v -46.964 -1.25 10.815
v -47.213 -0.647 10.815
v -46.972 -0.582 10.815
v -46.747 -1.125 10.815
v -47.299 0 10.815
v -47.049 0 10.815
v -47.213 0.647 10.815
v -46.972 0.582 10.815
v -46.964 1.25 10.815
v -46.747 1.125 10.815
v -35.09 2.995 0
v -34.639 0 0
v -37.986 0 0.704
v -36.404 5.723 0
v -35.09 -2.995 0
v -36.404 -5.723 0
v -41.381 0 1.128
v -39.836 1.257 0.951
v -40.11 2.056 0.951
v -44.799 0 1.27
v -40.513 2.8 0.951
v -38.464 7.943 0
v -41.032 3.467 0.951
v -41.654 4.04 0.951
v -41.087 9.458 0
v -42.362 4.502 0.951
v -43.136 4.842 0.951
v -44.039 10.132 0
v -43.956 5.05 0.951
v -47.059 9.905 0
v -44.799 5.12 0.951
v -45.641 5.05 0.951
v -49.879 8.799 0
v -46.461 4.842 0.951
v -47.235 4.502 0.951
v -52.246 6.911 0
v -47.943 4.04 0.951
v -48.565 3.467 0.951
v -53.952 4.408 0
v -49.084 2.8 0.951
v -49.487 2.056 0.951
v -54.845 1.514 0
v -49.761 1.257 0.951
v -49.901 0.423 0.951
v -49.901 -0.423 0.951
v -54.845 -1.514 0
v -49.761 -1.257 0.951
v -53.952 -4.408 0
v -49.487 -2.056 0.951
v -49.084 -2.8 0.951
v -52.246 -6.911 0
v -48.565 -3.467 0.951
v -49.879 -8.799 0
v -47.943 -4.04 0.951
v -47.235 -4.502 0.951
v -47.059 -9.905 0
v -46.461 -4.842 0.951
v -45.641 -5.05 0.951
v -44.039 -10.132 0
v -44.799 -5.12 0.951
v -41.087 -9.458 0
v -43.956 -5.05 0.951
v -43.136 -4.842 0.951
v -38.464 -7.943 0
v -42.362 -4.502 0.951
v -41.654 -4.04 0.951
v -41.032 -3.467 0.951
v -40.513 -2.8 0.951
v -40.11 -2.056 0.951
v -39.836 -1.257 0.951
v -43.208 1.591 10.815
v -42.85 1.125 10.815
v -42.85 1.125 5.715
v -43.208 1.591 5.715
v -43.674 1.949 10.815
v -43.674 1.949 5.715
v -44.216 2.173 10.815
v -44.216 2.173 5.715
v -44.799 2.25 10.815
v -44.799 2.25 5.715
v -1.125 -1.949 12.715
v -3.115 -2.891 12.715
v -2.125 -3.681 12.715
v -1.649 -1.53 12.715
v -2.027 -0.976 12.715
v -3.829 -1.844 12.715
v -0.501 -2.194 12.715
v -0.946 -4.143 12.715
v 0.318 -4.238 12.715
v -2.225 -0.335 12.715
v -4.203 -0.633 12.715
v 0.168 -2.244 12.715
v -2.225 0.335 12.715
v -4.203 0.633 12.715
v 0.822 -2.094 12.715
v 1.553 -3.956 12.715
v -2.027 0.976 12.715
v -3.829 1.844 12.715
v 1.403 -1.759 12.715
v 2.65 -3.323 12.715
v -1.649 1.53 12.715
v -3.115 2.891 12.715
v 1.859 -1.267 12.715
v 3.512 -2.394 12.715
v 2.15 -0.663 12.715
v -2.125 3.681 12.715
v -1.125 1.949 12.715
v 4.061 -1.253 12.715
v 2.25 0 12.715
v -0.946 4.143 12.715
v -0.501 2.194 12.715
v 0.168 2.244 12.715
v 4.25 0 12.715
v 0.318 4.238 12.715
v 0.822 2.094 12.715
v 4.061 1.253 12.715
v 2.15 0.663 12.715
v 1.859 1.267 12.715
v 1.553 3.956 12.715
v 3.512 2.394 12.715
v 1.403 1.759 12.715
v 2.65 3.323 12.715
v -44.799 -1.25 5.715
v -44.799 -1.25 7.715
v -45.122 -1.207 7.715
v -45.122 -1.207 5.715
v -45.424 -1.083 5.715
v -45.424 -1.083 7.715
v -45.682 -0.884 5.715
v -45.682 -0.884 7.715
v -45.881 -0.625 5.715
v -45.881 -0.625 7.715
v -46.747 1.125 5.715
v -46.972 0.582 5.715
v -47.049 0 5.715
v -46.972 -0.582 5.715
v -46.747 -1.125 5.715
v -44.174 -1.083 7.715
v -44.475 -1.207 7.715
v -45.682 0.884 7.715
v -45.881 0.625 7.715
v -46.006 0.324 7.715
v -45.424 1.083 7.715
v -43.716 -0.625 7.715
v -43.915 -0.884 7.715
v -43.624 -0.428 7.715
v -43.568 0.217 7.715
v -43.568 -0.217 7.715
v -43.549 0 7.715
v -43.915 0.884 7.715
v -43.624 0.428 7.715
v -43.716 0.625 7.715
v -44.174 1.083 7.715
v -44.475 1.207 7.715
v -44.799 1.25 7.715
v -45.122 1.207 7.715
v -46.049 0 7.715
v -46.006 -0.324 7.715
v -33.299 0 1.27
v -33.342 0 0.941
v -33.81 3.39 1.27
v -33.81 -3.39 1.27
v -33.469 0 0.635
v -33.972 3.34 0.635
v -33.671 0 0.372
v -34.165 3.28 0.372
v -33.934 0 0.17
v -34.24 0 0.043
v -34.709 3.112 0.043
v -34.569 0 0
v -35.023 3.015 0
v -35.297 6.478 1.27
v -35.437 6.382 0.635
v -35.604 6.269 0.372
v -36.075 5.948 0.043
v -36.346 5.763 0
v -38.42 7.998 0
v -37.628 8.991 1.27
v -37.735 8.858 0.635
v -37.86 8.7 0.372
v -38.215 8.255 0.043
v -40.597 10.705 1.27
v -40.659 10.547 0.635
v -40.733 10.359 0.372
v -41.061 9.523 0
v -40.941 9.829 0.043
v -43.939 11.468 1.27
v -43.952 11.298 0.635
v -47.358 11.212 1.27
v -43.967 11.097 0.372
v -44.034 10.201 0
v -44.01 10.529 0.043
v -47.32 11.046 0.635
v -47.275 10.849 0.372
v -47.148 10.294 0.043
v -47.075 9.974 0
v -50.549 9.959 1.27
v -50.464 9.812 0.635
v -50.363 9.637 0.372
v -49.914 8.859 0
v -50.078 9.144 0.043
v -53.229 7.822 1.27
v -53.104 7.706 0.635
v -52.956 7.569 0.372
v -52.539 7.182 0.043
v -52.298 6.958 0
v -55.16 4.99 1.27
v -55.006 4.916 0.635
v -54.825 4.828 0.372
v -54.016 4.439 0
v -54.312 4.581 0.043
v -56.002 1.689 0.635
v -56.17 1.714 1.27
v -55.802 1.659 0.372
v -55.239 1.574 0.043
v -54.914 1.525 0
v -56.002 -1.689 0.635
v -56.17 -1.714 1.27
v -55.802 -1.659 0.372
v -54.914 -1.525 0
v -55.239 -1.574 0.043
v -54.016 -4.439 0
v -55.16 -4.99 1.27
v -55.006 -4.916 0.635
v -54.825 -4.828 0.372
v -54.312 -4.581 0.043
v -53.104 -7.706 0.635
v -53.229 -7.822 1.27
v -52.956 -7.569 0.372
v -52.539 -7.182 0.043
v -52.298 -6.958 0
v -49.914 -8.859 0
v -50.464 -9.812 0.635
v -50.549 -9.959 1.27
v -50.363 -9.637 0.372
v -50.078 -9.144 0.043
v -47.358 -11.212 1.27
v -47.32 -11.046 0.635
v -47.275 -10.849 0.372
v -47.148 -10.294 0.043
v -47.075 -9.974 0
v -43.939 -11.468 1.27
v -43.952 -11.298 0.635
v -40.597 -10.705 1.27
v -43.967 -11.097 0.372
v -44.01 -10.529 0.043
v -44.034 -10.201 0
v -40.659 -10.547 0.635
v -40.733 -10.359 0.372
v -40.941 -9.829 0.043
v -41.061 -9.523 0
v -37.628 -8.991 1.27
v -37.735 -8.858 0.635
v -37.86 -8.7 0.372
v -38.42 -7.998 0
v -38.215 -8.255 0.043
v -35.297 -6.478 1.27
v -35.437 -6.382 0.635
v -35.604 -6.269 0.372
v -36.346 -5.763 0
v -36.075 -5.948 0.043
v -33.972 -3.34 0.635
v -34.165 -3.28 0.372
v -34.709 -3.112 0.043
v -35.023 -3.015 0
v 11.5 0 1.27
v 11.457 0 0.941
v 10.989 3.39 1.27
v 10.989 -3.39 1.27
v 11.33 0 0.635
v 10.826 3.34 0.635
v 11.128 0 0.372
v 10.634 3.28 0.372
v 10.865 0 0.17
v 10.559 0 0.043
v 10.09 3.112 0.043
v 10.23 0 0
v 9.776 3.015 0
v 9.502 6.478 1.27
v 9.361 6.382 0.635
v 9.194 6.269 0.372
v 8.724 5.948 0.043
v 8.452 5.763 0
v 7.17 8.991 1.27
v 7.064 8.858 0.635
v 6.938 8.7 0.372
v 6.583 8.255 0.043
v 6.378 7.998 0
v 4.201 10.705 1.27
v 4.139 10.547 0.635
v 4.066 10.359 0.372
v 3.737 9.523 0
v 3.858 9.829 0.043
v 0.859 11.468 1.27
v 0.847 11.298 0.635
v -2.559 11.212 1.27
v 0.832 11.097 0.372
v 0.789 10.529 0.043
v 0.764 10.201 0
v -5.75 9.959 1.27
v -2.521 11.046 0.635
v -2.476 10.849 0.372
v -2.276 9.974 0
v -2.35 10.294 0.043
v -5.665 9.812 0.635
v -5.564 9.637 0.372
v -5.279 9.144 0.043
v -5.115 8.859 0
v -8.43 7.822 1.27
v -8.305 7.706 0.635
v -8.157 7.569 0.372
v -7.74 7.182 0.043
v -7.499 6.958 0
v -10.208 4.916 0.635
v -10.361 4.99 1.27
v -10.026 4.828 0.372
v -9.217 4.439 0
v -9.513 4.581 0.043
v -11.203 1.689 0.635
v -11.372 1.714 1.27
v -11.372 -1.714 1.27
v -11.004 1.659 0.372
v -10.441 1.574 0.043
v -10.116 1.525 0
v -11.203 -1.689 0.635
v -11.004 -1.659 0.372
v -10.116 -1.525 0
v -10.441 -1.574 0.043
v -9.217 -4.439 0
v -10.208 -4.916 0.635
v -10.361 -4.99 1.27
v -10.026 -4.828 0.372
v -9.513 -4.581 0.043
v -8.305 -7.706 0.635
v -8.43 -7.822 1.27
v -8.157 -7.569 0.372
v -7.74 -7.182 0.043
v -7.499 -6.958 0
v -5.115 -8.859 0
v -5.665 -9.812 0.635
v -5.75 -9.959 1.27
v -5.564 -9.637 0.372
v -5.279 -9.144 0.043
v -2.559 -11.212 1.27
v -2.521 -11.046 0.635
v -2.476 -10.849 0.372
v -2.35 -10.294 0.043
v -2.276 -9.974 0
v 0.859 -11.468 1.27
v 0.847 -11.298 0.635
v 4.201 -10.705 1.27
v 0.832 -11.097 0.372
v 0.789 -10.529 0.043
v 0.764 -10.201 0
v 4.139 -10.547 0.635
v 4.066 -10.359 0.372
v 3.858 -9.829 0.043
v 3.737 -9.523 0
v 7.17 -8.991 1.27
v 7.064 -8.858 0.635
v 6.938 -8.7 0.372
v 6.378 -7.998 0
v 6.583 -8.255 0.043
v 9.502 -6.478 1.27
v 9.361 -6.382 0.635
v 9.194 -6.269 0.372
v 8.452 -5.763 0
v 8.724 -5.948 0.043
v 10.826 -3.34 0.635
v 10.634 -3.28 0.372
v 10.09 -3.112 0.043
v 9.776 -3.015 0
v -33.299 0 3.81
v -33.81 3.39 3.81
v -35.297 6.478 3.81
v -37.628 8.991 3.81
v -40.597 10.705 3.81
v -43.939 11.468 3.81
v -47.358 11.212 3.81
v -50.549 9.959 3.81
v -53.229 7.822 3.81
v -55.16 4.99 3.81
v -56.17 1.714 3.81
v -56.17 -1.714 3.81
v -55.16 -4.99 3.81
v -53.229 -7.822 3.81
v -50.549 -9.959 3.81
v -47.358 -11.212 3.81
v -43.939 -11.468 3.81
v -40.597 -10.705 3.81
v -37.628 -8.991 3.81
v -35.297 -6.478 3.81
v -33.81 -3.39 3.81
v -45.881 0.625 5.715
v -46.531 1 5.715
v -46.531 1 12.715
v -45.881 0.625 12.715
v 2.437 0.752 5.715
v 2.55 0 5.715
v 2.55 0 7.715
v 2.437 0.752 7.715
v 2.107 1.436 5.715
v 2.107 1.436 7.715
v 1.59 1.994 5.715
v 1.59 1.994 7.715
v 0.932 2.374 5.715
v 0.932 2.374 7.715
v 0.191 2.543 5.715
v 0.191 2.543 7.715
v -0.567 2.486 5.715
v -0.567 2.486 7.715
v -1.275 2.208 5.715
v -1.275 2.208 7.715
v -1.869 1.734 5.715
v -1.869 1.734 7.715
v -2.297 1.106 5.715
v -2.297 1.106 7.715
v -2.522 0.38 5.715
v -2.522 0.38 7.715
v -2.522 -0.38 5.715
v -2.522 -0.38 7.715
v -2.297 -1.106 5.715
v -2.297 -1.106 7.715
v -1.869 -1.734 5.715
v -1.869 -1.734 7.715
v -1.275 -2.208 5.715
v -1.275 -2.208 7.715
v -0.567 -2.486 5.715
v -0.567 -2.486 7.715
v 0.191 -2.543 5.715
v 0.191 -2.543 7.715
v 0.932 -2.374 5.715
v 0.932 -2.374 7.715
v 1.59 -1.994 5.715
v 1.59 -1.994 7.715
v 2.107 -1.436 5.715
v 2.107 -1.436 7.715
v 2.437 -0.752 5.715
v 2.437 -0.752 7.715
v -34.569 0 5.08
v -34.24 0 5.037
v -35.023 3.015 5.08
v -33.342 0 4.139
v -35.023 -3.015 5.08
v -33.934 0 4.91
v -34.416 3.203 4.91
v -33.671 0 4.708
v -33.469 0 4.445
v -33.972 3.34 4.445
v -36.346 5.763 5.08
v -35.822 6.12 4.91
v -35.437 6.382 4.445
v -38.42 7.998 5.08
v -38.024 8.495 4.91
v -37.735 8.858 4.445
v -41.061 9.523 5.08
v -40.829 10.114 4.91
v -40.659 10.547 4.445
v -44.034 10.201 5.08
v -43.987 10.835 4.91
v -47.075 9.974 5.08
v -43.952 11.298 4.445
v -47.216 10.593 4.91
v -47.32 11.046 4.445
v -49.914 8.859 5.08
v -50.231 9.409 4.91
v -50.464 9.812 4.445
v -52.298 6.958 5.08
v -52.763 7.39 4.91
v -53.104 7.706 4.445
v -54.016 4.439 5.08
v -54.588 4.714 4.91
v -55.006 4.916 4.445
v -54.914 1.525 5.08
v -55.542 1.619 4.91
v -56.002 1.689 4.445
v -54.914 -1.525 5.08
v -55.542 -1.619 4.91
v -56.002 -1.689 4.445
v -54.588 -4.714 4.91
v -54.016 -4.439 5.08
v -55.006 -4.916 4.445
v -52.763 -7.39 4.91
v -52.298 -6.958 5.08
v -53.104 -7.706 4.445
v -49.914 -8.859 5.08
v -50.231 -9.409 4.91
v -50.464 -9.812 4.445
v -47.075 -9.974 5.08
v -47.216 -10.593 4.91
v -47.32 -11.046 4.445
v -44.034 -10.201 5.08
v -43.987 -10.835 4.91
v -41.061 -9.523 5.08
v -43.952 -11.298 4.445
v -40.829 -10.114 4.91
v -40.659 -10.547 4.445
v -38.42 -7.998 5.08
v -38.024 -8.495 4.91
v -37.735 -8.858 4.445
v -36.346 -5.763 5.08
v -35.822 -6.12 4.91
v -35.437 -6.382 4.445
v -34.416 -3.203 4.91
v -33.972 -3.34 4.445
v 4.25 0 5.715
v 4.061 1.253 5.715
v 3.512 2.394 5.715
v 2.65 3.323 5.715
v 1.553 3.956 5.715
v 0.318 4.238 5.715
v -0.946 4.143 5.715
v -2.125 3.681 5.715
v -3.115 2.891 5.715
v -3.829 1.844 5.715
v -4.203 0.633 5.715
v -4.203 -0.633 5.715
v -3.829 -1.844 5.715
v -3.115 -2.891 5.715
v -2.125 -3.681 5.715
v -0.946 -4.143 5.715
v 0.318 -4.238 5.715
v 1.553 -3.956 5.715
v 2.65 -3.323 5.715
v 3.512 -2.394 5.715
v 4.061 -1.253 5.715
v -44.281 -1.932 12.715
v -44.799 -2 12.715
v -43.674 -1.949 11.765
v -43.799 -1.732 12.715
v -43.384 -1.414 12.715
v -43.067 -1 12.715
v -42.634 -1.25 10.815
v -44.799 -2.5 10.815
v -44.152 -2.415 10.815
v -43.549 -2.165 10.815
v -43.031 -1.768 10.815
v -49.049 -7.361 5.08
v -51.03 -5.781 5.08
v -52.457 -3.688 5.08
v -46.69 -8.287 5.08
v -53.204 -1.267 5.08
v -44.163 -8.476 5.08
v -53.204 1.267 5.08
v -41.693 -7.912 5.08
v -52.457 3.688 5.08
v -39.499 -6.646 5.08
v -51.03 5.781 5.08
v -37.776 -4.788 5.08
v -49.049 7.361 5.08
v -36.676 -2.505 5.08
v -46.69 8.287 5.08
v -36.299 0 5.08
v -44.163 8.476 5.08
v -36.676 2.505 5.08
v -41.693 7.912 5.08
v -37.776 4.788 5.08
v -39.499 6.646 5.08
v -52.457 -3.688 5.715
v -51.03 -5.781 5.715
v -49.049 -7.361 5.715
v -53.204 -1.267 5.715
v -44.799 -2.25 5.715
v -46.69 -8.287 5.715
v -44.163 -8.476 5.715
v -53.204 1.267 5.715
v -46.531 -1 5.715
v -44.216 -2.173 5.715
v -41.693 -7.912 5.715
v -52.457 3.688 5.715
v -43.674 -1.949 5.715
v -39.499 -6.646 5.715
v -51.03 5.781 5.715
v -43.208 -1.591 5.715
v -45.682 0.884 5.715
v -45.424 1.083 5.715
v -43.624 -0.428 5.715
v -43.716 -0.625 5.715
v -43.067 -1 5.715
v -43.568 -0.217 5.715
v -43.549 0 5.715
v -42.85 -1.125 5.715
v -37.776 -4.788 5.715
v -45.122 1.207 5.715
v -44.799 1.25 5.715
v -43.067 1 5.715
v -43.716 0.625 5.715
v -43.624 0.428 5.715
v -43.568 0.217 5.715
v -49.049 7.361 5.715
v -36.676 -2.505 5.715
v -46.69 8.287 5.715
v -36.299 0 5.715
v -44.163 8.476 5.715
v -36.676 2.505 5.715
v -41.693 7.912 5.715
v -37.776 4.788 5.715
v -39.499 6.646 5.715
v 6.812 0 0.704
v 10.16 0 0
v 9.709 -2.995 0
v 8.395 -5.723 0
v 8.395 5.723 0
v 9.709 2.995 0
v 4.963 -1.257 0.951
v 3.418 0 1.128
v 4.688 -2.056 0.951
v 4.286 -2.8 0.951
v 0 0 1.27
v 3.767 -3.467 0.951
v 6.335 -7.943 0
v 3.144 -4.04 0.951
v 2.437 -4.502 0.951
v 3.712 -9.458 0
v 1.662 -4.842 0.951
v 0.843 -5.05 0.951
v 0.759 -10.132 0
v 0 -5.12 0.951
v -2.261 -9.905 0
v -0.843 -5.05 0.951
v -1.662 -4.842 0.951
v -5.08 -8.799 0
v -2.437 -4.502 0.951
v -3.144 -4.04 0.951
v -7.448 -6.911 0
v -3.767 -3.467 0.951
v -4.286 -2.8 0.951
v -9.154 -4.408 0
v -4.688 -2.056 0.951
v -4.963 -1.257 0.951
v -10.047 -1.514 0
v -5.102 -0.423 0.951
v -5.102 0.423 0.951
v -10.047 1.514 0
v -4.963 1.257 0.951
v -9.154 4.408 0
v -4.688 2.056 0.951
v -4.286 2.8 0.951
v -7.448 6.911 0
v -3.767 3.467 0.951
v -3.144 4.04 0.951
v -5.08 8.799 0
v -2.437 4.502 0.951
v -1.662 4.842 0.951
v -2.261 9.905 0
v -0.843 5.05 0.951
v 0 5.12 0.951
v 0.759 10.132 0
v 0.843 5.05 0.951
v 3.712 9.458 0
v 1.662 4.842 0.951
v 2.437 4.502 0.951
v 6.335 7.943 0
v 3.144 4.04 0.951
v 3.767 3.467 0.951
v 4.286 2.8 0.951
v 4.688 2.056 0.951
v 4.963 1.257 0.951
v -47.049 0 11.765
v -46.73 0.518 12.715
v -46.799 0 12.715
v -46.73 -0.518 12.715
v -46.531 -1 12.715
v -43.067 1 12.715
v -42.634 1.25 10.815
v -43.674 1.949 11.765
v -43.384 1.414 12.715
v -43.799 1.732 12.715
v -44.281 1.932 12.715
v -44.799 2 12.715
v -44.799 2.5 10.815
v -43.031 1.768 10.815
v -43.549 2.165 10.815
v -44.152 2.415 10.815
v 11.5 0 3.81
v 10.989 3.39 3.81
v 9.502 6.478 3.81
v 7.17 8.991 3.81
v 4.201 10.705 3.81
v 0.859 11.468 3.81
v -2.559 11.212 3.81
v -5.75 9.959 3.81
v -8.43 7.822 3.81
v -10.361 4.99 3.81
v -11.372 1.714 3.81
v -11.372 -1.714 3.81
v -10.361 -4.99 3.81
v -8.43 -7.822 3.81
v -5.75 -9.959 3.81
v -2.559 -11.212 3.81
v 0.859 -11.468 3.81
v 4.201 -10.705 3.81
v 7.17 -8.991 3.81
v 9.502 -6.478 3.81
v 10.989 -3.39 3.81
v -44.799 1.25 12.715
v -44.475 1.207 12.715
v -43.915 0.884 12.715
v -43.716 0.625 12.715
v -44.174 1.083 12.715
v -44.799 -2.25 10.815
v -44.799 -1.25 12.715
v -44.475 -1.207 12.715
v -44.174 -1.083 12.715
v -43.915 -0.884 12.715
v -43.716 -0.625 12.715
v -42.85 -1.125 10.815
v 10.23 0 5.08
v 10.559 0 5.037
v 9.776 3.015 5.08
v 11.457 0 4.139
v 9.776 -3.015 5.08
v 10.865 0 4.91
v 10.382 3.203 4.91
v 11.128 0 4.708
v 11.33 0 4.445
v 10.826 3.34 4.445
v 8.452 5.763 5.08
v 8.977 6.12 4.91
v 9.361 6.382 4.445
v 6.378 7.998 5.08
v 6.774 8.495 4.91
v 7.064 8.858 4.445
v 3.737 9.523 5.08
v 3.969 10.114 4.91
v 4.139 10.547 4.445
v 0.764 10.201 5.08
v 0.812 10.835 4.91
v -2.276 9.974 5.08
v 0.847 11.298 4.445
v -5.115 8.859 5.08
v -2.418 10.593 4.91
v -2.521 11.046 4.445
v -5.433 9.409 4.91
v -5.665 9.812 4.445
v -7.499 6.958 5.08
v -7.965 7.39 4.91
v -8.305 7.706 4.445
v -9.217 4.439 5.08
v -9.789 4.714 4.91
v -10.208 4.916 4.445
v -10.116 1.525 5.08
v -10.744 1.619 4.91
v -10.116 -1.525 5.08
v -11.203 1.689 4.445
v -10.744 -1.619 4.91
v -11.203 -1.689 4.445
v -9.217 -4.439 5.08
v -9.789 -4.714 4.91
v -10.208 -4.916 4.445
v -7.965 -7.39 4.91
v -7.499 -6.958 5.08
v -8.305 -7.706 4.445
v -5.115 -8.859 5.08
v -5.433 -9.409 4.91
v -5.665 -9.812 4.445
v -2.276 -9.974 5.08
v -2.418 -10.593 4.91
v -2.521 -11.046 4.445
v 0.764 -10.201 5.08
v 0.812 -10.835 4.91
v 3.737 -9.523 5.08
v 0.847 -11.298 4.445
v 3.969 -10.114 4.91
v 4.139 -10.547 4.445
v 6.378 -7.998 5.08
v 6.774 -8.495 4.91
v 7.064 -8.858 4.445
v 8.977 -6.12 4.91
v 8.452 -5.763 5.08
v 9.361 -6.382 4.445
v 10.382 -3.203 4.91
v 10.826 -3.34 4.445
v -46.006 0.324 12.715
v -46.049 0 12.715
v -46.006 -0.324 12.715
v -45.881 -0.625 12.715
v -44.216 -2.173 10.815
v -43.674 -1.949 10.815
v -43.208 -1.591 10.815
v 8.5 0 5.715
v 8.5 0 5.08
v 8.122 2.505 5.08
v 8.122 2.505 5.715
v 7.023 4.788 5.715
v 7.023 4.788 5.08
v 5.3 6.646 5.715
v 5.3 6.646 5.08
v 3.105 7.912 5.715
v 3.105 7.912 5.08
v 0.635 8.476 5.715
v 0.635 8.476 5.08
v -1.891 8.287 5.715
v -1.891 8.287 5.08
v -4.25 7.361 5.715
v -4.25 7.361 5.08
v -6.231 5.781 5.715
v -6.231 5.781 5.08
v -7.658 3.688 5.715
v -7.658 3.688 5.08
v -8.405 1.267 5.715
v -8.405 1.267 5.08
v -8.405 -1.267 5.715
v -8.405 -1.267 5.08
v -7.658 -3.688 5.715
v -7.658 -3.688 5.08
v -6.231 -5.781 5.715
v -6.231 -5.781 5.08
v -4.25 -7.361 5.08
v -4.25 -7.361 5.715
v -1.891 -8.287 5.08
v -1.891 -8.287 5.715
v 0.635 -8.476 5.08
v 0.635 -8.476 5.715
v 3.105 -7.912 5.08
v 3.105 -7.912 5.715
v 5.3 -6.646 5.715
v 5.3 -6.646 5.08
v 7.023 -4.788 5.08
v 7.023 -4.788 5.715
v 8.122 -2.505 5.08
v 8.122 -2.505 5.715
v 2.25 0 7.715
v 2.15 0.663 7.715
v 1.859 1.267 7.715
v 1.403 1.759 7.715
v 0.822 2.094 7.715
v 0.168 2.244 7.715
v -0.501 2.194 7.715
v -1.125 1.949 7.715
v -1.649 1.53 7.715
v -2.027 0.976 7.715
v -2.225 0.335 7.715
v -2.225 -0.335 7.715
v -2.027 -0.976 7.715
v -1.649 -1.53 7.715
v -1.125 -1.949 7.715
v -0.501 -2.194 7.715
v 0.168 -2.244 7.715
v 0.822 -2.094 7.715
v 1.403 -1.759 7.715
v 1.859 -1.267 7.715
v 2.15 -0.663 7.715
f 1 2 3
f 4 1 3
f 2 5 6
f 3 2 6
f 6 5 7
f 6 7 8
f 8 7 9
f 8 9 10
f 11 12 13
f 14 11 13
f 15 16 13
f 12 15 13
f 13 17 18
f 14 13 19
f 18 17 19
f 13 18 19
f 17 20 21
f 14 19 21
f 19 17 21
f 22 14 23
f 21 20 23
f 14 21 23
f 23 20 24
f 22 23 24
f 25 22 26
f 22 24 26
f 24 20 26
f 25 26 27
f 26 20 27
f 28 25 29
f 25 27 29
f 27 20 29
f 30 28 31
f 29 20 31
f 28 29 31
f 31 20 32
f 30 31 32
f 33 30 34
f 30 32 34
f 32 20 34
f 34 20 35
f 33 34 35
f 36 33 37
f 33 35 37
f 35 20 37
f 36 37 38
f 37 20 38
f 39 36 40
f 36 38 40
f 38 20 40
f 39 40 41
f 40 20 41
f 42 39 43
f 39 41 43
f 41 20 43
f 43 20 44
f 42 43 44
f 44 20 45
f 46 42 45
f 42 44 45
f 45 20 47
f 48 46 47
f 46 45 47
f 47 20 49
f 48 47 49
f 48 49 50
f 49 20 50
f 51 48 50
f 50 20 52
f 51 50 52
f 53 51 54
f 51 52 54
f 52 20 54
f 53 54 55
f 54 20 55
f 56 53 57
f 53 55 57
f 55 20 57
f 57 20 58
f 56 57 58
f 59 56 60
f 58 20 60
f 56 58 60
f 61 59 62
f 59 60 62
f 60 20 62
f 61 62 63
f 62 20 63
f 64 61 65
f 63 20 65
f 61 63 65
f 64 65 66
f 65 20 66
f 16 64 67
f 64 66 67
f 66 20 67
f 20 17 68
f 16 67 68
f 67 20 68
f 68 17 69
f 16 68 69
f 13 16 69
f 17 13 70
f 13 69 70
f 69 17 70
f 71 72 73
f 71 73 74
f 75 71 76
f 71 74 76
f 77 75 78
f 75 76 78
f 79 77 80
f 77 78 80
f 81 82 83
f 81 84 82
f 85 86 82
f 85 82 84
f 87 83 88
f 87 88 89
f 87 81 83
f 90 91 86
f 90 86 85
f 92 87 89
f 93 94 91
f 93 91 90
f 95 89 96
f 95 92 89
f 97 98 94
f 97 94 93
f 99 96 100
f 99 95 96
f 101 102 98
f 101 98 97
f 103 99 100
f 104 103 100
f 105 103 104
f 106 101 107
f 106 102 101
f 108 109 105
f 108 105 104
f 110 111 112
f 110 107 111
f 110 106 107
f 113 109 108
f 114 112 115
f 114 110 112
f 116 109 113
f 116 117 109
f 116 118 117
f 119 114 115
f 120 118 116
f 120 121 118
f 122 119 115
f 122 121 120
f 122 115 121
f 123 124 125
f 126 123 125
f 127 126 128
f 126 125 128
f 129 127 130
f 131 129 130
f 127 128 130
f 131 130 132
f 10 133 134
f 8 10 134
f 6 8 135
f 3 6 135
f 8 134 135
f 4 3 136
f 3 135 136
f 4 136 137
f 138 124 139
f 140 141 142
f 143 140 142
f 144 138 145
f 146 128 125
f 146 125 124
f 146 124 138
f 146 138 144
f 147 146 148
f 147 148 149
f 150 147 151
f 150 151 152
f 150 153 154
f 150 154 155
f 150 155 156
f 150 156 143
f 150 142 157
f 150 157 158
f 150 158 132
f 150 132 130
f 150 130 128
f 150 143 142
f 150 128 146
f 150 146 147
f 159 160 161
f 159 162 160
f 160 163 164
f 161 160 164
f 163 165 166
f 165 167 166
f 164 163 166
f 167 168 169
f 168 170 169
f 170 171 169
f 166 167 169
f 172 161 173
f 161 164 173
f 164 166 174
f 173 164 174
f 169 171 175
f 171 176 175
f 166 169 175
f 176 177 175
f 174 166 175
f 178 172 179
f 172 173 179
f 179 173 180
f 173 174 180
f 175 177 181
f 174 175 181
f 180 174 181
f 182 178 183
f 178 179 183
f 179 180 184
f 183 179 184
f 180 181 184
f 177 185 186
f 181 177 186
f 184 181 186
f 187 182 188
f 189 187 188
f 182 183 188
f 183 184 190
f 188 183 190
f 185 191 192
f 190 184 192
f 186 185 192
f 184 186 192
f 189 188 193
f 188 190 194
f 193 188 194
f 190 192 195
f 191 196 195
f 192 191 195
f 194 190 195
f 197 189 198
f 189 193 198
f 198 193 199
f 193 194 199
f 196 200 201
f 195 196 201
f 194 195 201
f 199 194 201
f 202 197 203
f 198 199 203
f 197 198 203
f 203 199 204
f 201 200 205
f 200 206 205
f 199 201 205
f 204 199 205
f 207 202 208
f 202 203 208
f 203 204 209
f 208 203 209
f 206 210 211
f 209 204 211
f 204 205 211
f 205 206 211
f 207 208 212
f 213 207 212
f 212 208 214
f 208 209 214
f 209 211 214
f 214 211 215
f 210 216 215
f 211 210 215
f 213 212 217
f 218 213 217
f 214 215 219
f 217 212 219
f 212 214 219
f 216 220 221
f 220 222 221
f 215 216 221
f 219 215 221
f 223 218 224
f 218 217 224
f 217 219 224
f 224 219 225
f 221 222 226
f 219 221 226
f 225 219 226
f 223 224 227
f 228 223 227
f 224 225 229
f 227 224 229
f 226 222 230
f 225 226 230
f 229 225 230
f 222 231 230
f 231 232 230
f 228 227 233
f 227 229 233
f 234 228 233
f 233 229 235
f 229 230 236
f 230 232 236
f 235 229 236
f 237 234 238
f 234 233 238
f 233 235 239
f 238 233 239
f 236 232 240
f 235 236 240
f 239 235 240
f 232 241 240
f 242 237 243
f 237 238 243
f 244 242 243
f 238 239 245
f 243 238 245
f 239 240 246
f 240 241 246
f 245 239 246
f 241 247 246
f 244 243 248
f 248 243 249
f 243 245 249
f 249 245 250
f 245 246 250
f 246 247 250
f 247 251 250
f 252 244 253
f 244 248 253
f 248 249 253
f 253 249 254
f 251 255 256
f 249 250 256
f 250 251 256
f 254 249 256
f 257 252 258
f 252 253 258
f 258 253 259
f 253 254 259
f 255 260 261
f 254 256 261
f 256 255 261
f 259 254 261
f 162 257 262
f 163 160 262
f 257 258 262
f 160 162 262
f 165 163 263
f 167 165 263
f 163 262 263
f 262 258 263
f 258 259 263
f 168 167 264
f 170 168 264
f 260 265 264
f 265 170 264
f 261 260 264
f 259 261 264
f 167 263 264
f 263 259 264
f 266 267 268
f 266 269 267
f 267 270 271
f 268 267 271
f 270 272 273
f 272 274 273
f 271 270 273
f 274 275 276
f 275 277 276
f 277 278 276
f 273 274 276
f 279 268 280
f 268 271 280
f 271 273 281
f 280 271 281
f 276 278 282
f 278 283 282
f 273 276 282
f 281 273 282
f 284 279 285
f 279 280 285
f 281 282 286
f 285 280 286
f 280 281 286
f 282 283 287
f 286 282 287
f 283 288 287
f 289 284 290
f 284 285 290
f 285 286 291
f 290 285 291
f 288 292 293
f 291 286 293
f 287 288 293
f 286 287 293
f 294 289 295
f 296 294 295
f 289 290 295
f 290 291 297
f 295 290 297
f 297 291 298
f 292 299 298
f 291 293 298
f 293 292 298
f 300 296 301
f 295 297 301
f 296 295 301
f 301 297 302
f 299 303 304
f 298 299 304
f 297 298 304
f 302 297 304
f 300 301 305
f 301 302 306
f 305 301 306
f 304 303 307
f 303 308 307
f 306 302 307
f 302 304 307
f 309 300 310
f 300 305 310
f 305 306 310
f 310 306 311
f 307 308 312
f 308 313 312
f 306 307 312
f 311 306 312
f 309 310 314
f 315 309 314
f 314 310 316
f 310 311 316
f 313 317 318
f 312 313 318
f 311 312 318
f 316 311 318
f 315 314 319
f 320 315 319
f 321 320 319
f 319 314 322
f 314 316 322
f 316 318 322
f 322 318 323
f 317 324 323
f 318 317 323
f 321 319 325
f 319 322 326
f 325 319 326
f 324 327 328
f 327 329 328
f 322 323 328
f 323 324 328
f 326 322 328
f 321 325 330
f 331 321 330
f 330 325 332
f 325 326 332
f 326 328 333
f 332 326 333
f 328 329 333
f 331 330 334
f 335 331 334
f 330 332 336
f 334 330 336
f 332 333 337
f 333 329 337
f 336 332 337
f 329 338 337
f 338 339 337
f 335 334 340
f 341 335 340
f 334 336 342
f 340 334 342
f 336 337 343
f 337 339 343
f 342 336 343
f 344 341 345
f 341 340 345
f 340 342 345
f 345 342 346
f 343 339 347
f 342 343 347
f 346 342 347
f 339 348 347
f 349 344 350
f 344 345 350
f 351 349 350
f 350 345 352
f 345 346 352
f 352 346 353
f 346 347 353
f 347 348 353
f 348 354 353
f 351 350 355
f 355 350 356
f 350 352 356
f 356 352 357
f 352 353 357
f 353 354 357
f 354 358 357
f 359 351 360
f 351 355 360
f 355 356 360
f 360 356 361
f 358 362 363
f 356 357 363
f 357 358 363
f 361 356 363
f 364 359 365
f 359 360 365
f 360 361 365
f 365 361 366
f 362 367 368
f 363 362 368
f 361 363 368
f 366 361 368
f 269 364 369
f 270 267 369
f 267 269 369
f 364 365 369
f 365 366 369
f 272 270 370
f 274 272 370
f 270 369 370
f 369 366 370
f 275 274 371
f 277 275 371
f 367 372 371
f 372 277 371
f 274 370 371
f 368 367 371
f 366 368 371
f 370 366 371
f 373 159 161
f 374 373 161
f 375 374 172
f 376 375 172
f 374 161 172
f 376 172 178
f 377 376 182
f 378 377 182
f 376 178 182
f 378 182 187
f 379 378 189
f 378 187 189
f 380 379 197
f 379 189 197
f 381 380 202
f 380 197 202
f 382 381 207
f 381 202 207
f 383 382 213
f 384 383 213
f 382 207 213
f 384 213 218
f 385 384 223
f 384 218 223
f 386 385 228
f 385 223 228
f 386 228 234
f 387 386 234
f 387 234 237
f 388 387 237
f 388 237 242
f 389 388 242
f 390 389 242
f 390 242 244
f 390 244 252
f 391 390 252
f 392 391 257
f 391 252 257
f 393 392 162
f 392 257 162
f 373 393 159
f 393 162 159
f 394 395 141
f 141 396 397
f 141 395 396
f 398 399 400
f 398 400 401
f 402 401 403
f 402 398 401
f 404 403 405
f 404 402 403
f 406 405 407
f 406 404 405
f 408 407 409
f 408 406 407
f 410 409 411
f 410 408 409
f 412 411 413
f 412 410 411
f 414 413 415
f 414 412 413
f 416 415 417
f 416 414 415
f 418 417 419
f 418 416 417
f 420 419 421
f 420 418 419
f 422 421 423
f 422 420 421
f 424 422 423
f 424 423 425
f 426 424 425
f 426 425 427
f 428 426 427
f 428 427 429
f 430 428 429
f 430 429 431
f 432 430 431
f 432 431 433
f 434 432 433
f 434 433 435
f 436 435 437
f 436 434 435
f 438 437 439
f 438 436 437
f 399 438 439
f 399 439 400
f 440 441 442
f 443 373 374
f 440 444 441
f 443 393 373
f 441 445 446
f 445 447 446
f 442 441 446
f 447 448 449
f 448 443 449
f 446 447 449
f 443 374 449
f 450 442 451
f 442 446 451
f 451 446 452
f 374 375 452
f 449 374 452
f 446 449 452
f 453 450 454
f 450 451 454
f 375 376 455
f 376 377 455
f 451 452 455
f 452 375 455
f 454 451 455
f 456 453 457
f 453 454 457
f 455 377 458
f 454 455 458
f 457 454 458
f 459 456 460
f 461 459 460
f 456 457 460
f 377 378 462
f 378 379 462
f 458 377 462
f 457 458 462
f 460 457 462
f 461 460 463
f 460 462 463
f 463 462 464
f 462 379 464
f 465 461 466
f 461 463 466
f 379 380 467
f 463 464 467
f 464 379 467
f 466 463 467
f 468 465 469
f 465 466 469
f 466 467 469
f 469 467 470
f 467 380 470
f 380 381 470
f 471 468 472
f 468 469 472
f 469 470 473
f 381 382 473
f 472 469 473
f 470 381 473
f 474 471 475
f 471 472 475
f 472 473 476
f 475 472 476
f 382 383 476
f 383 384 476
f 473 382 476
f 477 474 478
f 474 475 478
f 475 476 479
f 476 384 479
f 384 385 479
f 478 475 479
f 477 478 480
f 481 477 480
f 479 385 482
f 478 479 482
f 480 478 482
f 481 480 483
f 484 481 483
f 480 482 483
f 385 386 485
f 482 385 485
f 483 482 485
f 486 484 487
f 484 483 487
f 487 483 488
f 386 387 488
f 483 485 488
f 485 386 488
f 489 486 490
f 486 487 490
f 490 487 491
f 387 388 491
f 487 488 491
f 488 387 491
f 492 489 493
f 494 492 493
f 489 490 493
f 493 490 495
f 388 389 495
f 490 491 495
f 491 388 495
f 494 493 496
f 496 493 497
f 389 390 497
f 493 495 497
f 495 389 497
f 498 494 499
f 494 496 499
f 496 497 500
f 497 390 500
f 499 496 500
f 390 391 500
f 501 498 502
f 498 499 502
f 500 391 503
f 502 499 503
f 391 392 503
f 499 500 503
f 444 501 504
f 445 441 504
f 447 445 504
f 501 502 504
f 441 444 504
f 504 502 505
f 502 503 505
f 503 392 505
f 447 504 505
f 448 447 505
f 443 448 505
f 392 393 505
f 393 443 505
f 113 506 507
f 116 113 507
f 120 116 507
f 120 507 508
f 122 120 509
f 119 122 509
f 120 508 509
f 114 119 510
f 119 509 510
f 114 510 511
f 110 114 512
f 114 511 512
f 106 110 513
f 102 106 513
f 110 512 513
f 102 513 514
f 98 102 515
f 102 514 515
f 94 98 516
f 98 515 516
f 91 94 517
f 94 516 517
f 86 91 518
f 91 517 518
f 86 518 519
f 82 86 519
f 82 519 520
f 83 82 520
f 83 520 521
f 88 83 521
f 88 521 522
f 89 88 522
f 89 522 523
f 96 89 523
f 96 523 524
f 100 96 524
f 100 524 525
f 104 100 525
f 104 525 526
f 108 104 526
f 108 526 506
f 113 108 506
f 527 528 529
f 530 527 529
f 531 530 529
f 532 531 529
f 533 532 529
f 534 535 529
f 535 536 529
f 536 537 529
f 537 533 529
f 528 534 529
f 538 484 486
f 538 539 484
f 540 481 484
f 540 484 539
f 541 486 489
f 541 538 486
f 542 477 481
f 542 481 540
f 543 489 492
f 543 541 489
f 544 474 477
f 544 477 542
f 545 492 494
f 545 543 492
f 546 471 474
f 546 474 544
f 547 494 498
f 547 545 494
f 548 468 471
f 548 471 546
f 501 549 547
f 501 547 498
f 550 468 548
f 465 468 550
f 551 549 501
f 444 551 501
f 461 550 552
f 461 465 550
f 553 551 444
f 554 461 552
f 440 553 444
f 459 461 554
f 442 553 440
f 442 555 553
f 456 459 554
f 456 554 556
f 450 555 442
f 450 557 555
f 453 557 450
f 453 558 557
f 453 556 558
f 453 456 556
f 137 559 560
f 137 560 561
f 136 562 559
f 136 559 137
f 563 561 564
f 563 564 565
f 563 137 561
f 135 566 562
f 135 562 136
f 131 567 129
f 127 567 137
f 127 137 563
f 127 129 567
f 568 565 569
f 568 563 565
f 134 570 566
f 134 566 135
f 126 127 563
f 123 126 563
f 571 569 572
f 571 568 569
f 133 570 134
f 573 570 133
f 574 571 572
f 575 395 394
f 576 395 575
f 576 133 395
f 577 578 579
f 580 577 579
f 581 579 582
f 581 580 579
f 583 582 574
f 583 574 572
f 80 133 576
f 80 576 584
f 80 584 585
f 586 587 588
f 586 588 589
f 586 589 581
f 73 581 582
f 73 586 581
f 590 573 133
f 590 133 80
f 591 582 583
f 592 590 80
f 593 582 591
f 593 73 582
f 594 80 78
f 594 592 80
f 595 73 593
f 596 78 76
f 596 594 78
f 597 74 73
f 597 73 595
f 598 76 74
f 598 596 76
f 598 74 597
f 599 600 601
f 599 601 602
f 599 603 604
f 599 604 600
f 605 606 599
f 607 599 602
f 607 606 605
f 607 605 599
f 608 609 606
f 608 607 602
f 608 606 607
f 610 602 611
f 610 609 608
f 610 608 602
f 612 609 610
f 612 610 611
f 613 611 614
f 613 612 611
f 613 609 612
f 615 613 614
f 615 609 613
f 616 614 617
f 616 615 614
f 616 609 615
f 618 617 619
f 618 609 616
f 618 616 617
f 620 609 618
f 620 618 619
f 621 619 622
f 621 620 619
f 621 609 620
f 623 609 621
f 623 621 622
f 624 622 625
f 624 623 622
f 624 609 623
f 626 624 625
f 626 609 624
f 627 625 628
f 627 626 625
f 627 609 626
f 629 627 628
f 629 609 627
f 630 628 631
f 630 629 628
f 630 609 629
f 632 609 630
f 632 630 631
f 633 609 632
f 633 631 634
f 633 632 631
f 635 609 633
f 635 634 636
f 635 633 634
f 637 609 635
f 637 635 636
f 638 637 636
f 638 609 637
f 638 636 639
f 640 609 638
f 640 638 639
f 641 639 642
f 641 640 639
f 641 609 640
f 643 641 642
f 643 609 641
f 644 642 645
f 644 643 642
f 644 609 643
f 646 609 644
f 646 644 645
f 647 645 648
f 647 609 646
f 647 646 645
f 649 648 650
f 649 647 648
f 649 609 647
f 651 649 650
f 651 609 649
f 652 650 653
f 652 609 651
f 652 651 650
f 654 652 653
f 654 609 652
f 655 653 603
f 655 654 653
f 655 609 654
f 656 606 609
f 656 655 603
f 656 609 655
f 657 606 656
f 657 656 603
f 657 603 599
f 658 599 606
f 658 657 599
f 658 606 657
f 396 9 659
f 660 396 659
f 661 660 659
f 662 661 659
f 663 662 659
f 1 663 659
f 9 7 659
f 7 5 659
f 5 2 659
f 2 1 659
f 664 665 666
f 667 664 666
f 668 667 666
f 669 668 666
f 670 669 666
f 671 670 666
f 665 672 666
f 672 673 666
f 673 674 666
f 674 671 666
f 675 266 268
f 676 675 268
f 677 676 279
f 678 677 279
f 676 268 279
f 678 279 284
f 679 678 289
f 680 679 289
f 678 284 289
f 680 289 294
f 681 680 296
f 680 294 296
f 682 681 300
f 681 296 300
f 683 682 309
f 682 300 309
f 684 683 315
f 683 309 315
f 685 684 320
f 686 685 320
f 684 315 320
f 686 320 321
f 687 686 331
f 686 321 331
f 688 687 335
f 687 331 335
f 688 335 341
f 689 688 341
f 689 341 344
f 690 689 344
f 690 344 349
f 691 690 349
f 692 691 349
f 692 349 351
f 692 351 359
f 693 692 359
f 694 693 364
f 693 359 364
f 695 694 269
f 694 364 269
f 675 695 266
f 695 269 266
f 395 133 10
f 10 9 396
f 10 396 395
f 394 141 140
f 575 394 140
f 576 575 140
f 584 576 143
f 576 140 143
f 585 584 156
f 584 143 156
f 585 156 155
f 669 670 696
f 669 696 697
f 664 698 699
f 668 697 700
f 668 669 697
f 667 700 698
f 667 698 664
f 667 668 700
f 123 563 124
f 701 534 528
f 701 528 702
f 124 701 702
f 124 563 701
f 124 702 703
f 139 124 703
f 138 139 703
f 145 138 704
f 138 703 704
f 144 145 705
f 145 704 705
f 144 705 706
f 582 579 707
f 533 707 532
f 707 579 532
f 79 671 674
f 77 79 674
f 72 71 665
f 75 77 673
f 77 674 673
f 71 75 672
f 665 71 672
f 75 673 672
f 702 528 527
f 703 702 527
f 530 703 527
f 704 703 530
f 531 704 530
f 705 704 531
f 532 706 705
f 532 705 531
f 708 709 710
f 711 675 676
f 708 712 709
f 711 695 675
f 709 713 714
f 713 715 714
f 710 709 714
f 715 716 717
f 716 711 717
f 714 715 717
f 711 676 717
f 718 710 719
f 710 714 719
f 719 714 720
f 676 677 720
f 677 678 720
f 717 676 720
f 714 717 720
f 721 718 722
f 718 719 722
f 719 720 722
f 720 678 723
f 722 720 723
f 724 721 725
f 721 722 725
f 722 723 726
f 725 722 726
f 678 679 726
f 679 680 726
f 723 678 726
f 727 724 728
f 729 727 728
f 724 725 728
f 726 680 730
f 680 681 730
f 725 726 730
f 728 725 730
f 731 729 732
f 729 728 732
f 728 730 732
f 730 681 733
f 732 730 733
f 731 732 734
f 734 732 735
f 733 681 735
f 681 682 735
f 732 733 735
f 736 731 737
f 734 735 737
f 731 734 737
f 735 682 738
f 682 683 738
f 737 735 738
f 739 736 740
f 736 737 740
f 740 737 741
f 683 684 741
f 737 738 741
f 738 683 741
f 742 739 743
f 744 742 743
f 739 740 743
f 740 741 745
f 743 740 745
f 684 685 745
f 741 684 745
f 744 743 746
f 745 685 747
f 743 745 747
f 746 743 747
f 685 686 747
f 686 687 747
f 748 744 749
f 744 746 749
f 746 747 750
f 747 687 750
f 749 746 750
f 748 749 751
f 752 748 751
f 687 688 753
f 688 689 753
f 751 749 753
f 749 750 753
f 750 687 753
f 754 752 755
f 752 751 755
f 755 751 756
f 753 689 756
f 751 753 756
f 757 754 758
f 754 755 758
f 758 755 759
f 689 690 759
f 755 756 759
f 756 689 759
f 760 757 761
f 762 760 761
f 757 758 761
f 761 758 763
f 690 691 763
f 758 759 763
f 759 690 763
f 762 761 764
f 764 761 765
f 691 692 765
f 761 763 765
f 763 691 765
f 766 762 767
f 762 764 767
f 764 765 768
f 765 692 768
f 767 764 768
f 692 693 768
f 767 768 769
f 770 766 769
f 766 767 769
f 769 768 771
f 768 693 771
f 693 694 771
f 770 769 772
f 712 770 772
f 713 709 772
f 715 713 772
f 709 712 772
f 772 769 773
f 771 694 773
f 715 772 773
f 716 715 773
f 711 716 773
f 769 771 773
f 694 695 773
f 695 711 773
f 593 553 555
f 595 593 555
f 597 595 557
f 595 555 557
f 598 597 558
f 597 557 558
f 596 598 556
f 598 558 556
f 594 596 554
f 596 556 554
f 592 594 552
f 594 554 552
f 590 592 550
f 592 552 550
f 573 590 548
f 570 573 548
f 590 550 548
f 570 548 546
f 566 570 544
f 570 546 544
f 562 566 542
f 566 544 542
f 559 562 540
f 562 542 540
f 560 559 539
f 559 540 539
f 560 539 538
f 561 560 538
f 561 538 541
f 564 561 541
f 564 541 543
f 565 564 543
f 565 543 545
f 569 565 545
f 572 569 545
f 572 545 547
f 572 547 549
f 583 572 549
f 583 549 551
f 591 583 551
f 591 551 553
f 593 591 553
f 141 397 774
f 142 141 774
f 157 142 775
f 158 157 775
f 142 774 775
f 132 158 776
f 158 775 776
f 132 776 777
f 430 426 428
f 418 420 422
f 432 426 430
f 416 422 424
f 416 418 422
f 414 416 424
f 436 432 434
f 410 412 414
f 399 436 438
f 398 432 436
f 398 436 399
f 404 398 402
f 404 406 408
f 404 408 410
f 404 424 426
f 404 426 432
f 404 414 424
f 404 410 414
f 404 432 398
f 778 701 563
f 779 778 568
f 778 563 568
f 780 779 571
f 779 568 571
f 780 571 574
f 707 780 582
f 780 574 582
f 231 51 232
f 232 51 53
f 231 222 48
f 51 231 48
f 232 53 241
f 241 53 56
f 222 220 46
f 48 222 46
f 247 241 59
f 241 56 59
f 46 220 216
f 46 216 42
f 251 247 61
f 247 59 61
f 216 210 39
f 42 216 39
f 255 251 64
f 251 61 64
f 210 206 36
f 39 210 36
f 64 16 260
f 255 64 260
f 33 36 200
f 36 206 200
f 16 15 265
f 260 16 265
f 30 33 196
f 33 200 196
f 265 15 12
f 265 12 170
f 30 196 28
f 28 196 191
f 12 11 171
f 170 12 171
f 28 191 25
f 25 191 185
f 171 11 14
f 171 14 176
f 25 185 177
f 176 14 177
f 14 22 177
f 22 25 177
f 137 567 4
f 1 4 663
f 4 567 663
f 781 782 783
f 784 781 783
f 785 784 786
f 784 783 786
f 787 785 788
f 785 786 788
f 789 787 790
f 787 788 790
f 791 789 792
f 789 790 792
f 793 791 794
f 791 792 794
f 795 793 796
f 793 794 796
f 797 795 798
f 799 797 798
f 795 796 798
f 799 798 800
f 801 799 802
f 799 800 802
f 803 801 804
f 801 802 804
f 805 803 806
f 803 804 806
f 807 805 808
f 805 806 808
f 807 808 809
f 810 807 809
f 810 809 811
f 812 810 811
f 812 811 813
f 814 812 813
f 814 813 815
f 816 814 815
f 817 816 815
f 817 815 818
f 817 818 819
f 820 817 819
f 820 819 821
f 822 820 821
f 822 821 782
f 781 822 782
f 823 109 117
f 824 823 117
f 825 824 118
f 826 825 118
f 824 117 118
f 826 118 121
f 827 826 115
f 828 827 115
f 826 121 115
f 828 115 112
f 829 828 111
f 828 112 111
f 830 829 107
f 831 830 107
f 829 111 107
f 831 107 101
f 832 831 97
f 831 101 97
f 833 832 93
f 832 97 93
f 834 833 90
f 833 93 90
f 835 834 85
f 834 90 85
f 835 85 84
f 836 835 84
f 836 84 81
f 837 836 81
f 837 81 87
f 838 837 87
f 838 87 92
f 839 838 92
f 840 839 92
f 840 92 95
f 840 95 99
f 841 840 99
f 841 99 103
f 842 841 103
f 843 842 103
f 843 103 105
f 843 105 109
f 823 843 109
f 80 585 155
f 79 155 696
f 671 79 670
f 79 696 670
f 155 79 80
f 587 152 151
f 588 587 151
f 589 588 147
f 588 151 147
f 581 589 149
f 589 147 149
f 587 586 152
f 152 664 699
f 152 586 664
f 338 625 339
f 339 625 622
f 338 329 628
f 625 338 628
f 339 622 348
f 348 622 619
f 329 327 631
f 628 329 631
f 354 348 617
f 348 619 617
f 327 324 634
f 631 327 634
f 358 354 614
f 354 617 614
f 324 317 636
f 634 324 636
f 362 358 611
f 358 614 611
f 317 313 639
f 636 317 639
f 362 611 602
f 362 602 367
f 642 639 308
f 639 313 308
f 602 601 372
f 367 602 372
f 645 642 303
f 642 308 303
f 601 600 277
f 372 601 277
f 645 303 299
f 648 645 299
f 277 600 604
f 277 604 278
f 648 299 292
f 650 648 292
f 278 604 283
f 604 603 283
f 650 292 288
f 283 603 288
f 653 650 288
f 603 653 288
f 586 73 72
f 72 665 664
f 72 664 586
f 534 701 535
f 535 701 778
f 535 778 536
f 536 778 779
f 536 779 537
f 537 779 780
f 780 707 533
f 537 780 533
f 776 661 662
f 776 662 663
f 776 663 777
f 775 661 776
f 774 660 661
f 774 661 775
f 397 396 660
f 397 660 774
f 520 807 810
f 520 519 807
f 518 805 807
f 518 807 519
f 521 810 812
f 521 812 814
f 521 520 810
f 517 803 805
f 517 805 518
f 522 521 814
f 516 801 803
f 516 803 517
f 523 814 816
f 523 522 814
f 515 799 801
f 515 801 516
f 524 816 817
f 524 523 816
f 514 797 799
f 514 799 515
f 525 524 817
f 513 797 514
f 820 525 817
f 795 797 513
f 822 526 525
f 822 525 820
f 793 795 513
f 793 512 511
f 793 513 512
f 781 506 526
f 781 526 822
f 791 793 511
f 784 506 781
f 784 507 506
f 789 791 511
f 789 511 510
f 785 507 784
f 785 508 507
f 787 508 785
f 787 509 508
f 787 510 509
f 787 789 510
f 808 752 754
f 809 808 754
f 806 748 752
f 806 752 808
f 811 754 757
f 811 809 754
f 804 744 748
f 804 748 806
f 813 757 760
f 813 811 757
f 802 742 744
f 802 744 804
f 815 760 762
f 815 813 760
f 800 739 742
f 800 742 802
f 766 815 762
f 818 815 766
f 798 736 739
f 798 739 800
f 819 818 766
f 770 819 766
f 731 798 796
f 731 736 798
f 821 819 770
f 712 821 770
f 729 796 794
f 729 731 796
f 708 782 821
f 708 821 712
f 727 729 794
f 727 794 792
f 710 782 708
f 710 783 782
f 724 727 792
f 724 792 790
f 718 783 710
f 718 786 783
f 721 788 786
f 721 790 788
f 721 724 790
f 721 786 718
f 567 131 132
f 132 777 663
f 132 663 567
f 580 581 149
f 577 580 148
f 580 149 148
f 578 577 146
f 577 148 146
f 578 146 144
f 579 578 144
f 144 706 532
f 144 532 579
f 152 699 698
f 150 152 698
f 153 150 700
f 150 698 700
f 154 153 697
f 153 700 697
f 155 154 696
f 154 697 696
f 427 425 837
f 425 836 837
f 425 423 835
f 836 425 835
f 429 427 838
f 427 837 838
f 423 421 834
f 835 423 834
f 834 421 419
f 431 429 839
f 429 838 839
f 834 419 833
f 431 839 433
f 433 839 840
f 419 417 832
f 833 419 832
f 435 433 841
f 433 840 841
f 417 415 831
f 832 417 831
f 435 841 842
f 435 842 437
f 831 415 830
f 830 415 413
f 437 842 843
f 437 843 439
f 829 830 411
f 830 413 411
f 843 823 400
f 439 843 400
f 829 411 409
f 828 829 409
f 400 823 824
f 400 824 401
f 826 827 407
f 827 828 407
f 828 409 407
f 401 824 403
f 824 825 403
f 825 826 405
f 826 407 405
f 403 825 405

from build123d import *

# Parameters (mm, degrees)
F0_R      = 11.5
F0_R_2    = 8.5
F1_DEPTH  = 5.08
F0_R_3    = 4.25
F2_DEPTH  = 5.715
F3_DEPTH  = 12.715
F4_R      = 1.27
F5_R      = 11.5
F5_R_2    = 8.5
F6_DEPTH  = 5.08
F5_R_3    = 2.5
F7_DEPTH  = 5.715
F8_DEPTH  = 12.715
F9_R      = 2.25
F10_DEPTH = 7
F11_R     = 1.27
F12_R     = 2.55
F13_DEPTH = 2
F16_R     = 1.25
F17_DEPTH = 5
F19_DEPTH = 7


with BuildPart() as f1:
    # F0 (on Top) → F1 (new body)
    with BuildSketch(Plane.XY):
        Circle(F0_R)
        Circle(F0_R_2, mode=Mode.SUBTRACT)
    extrude(amount=F1_DEPTH)

    # F0 (on Top) → F2 (join)
    with BuildSketch(Plane.XY):
        Circle(F0_R_2)
        Circle(F0_R_3, mode=Mode.SUBTRACT)
    extrude(amount=F2_DEPTH)

    # F0 (on Top) → F3 (join)
    with BuildSketch(Plane.XY):
        Circle(F0_R_3)
    extrude(amount=F3_DEPTH)

    # F4
    f4_edges = [f1.edges().sort_by_distance(p)[0] for p in [
        (-11.5, 0, 5.08),
        (-11.5, 0, 0),
    ]]
    fillet(f4_edges, radius=F4_R)

    # F9 (on face) → F10 (cut)
    with BuildSketch(Plane.XY.offset(12.715)):
        Circle(F9_R)
    extrude(amount=-F10_DEPTH, mode=Mode.SUBTRACT)

    # F12 (on face) → F13 (cut)
    with BuildSketch(Plane.XY.offset(5.715)):
        Circle(F12_R)
    extrude(amount=F13_DEPTH, mode=Mode.SUBTRACT)

    # F20 (on Front) → F21 (revolve, cut)
    with BuildSketch(Plane.XZ):
        with BuildLine():
            Line((0, 1.27), (0, 0))
            Line((0, 0), (10.16, 0))
            ThreePointArc((10.16, 0), (5.1195336702, 0.9512693614), (0, 1.27))
        make_face()
    revolve(axis=Axis((0, 0, -1.3599131489), (0, 0, -1)), mode=Mode.SUBTRACT)


with BuildPart() as f6:
    # F5 (on Top) → F6 (new body)
    with BuildSketch(Plane.XY):
        with Locations((-44.7985892718, 0)):
            Circle(F5_R)
        with Locations((-44.7985892718, 0)):
            Circle(F5_R_2, mode=Mode.SUBTRACT)
    extrude(amount=F6_DEPTH)

    # F5 (on Top) → F7 (join)
    with BuildSketch(Plane.XY):
        with Locations((-44.7985892718, 0)):
            Circle(F5_R_2)
        with Locations((-44.7985892718, 0)):
            Circle(F5_R_3, mode=Mode.SUBTRACT)
    extrude(amount=F7_DEPTH)

    # F5 (on Top) → F8 (join)
    with BuildSketch(Plane.XY):
        with Locations((-44.7985892718, 0)):
            Circle(F5_R_3)
    extrude(amount=F8_DEPTH)

    # F11
    f11_edges = [f6.edges().sort_by_distance(p)[0] for p in [
        (-56.298589, 0, 5.08),
        (-56.298589, 0, 0),
    ]]
    fillet(f11_edges, radius=F11_R)

    # F14 (on Front) → F15 (revolve, cut)
    with BuildSketch(Plane.XZ):
        Polygon((-42.5485892718, 10.815), (-42.5485892718, 5.715), (-41.8997183442, 5.715), (-41.6368916631, 10.815), (-42.2985892718, 10.815), align=None)
        Polygon((-42.5485892718, 12.715), (-42.7985892718, 12.715), (-42.2985892718, 10.815), (-41.6368916631, 10.815), (-41.8774240868, 12.8033112086), align=None)
    revolve(axis=Axis((-44.7985892718, 0, 6.3575), (0, 0, 1)), mode=Mode.SUBTRACT)

    # F16 (on face) → F17 (cut)
    with BuildSketch(Plane.XY.offset(12.715)):
        with Locations((-44.7985892718, 0)):
            Circle(F16_R)
    extrude(amount=-F17_DEPTH, mode=Mode.SUBTRACT)

    # F18 (on face) → F19 (cut)
    with BuildSketch(Plane.XY.offset(12.715)):
        with BuildLine():
            Line((-44.7985892718, 2), (-44.7985892718, 3.5383357842))
            ThreePointArc((-44.7985892718, 3.5383357842), (-46.5677571638, 3.0642886762), (-47.862877948, 1.7691678921))
            Line((-47.862877948, 1.7691678921), (-46.5306400793, 1))
            ThreePointArc((-46.5306400793, 1), (-45.7985892718, 1.7320508076), (-44.7985892718, 2))
        make_face()
        with BuildLine():
            ThreePointArc((-41.7343005956, -1.7691678921), (-41.3808193558, -0.9157886889), (-41.2602534876, 0))
            ThreePointArc((-41.2602534876, 0), (-41.3808193558, 0.9157886889), (-41.7343005956, 1.7691678921))
            Line((-41.7343005956, 1.7691678921), (-43.0665384642, 1))
            ThreePointArc((-43.0665384642, 1), (-42.8667376192, 0.5176380902), (-42.7985892718, 0))
            ThreePointArc((-42.7985892718, 0), (-42.8667376192, -0.5176380902), (-43.0665384642, -1))
            Line((-43.0665384642, -1), (-41.7343005956, -1.7691678921))
        make_face()
        with BuildLine():
            ThreePointArc((-47.862877948, -1.7691678921), (-46.5677571638, -3.0642886762), (-44.7985892718, -3.5383357842))
            Line((-44.7985892718, -3.5383357842), (-44.7985892718, -2))
            ThreePointArc((-44.7985892718, -2), (-45.7985892718, -1.7320508076), (-46.5306400793, -1))
            Line((-46.5306400793, -1), (-47.862877948, -1.7691678921))
        make_face()
        with BuildLine():
            ThreePointArc((-42.7985892718, 0), (-42.8667376192, 0.5176380902), (-43.0665384642, 1))
            Line((-43.0665384642, 1), (-43.716057517, 0.625))
            ThreePointArc((-43.716057517, 0.625), (-43.5911819889, 0.3235238064), (-43.5485892718, 0))
            ThreePointArc((-43.5485892718, 0), (-43.5911819889, -0.3235238064), (-43.716057517, -0.625))
            Line((-43.716057517, -0.625), (-43.0665384642, -1))
            ThreePointArc((-43.0665384642, -1), (-42.8667376192, -0.5176380902), (-42.7985892718, 0))
        make_face()
        with BuildLine():
            ThreePointArc((-46.5306400793, -1), (-45.7985892718, -1.7320508076), (-44.7985892718, -2))
            Line((-44.7985892718, -2), (-44.7985892718, -1.25))
            ThreePointArc((-44.7985892718, -1.25), (-45.4235892718, -1.0825317547), (-45.8811210265, -0.625))
            Line((-45.8811210265, -0.625), (-46.5306400793, -1))
        make_face()
        with BuildLine():
            Line((-44.7985892718, 1.25), (-44.7985892718, 2))
            ThreePointArc((-44.7985892718, 2), (-45.7985892718, 1.7320508076), (-46.5306400793, 1))
            Line((-46.5306400793, 1), (-45.8811210265, 0.625))
            ThreePointArc((-45.8811210265, 0.625), (-45.4235892718, 1.0825317547), (-44.7985892718, 1.25))
        make_face()
    extrude(amount=-F19_DEPTH, mode=Mode.SUBTRACT)

    # F22 (on Front) → F23 (revolve, cut)
    with BuildSketch(Plane.XZ):
        with BuildLine():
            Line((-44.7985892718, 1.27), (-44.7985892718, 0))
            Line((-44.7985892718, 0), (-34.6385892718, 0))
            ThreePointArc((-34.6385892718, 0), (-39.6790556016, 0.9512693614), (-44.7985892718, 1.27))
        make_face()
    revolve(axis=Axis((-44.7985892718, 0, 0.635), (0, 0, 1)), mode=Mode.SUBTRACT)


solid = Compound([f1.part, f6.part])
